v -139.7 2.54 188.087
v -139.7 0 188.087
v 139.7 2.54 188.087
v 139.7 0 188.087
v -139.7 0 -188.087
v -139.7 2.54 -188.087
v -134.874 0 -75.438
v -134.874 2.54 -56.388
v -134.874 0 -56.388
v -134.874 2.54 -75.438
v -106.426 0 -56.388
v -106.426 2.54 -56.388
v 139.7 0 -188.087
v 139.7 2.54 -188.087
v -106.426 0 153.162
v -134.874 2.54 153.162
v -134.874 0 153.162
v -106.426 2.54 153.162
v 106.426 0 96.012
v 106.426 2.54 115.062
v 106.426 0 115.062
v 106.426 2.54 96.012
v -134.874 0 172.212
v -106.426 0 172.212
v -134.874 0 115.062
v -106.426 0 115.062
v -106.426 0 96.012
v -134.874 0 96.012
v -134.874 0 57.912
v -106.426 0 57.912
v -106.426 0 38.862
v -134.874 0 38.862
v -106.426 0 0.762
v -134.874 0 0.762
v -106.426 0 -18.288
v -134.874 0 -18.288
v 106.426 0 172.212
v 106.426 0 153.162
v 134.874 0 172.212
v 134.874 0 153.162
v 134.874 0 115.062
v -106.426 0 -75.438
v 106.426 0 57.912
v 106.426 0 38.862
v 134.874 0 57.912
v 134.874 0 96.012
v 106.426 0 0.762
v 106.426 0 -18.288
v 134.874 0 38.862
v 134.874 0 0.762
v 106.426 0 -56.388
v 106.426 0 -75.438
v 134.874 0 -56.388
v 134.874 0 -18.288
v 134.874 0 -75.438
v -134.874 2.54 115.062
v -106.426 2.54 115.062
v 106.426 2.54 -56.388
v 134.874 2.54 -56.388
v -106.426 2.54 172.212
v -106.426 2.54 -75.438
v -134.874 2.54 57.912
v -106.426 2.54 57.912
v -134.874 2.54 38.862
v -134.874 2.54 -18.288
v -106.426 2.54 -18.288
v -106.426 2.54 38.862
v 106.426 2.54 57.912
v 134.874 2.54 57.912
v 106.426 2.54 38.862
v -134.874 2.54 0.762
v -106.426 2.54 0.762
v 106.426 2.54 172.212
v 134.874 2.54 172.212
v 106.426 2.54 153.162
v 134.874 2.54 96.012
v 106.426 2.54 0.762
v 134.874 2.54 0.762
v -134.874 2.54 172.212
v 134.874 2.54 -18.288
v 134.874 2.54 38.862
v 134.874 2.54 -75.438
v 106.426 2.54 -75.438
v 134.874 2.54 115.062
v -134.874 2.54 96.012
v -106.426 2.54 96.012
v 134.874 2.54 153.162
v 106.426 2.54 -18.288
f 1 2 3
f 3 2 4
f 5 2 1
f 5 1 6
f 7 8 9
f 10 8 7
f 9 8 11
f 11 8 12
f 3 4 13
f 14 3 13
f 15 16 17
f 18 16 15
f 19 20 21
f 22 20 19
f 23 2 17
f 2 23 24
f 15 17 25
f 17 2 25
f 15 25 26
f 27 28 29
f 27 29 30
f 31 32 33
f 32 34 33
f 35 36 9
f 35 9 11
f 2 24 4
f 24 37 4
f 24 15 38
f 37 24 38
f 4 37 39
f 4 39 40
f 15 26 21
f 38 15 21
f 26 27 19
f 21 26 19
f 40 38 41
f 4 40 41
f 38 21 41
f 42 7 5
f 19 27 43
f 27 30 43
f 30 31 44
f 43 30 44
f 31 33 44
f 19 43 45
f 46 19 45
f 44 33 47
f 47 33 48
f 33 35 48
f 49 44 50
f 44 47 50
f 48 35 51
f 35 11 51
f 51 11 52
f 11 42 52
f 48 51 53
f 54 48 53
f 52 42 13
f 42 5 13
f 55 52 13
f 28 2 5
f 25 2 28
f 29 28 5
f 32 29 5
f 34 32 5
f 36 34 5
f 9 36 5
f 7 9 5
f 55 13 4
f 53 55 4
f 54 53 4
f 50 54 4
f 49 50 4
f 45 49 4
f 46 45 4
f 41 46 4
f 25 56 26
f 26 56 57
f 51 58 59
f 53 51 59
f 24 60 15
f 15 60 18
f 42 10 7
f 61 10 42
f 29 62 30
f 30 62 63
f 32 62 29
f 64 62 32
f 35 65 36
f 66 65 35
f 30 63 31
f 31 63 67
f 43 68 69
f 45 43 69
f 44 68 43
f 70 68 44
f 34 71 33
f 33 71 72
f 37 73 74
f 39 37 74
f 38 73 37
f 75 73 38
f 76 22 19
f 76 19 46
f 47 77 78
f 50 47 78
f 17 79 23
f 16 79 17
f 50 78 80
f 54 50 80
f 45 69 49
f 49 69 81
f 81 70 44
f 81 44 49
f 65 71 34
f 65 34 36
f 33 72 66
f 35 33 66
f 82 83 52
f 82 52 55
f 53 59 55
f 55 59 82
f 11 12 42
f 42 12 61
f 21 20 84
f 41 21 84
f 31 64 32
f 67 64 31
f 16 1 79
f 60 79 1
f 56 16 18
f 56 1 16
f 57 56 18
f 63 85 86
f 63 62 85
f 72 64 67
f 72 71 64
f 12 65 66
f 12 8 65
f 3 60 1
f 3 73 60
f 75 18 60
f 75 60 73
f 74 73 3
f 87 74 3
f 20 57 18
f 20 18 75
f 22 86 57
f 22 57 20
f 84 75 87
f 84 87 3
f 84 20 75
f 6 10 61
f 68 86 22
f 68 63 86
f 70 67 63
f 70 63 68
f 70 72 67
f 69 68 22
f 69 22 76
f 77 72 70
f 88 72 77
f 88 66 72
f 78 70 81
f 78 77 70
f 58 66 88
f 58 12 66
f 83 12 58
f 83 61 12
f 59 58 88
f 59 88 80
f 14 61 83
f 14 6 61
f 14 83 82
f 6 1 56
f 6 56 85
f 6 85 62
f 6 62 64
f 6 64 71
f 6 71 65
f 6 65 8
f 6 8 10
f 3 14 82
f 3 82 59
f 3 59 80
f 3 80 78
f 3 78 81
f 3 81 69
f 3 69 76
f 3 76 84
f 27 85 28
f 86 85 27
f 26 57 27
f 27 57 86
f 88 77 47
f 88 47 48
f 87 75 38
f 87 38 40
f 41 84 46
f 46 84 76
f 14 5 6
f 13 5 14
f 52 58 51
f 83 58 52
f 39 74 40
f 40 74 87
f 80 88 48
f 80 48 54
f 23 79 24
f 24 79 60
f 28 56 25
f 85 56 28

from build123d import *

# Parameters (mm, degrees)
SKETCH1_W           = 279.4
SKETCH1_H           = 376.174
BOSS_EXTRUDE1_DEPTH = 2.54
SKETCH2_W           = 28.448
SKETCH2_H           = 19.05
CUT_EXTRUDE1_DEPTH  = 235.305913645


with BuildPart() as part:
    # Sketch1 → Boss-Extrude1 (new body)
    with BuildSketch(Plane(origin=(0, 0, 0), x_dir=(1, 0, 0), z_dir=(0, 1, 0))):
        Rectangle(SKETCH1_W, SKETCH1_H)
    extrude(amount=BOSS_EXTRUDE1_DEPTH)

    # Sketch2 → Cut-Extrude1 (cut, through all)
    with BuildSketch(Plane(origin=(0, 2.54, 0), x_dir=(1, 0, 0), z_dir=(0, 1, 0))):
        with Locations((-120.65, -105.537)):
            Rectangle(SKETCH2_W, SKETCH2_H)
        with Locations((-120.65, -162.687)):
            Rectangle(SKETCH2_W, SKETCH2_H)
        with Locations((-120.65, -48.387)):
            Rectangle(SKETCH2_W, SKETCH2_H)
        with Locations((-120.65, 8.763)):
            Rectangle(SKETCH2_W, SKETCH2_H)
        with Locations((-120.65, 65.913)):
            Rectangle(SKETCH2_W, SKETCH2_H)
        with Locations((120.65, 65.913)):
            Rectangle(SKETCH2_W, SKETCH2_H)
        with Locations((120.65, 8.763)):
            Rectangle(SKETCH2_W, SKETCH2_H)
        with Locations((120.65, -48.387)):
            Rectangle(SKETCH2_W, SKETCH2_H)
        with Locations((120.65, -105.537)):
            Rectangle(SKETCH2_W, SKETCH2_H)
        with Locations((120.65, -162.687)):
            Rectangle(SKETCH2_W, SKETCH2_H)
    extrude(amount=-CUT_EXTRUDE1_DEPTH, mode=Mode.SUBTRACT)


solid = part.part
